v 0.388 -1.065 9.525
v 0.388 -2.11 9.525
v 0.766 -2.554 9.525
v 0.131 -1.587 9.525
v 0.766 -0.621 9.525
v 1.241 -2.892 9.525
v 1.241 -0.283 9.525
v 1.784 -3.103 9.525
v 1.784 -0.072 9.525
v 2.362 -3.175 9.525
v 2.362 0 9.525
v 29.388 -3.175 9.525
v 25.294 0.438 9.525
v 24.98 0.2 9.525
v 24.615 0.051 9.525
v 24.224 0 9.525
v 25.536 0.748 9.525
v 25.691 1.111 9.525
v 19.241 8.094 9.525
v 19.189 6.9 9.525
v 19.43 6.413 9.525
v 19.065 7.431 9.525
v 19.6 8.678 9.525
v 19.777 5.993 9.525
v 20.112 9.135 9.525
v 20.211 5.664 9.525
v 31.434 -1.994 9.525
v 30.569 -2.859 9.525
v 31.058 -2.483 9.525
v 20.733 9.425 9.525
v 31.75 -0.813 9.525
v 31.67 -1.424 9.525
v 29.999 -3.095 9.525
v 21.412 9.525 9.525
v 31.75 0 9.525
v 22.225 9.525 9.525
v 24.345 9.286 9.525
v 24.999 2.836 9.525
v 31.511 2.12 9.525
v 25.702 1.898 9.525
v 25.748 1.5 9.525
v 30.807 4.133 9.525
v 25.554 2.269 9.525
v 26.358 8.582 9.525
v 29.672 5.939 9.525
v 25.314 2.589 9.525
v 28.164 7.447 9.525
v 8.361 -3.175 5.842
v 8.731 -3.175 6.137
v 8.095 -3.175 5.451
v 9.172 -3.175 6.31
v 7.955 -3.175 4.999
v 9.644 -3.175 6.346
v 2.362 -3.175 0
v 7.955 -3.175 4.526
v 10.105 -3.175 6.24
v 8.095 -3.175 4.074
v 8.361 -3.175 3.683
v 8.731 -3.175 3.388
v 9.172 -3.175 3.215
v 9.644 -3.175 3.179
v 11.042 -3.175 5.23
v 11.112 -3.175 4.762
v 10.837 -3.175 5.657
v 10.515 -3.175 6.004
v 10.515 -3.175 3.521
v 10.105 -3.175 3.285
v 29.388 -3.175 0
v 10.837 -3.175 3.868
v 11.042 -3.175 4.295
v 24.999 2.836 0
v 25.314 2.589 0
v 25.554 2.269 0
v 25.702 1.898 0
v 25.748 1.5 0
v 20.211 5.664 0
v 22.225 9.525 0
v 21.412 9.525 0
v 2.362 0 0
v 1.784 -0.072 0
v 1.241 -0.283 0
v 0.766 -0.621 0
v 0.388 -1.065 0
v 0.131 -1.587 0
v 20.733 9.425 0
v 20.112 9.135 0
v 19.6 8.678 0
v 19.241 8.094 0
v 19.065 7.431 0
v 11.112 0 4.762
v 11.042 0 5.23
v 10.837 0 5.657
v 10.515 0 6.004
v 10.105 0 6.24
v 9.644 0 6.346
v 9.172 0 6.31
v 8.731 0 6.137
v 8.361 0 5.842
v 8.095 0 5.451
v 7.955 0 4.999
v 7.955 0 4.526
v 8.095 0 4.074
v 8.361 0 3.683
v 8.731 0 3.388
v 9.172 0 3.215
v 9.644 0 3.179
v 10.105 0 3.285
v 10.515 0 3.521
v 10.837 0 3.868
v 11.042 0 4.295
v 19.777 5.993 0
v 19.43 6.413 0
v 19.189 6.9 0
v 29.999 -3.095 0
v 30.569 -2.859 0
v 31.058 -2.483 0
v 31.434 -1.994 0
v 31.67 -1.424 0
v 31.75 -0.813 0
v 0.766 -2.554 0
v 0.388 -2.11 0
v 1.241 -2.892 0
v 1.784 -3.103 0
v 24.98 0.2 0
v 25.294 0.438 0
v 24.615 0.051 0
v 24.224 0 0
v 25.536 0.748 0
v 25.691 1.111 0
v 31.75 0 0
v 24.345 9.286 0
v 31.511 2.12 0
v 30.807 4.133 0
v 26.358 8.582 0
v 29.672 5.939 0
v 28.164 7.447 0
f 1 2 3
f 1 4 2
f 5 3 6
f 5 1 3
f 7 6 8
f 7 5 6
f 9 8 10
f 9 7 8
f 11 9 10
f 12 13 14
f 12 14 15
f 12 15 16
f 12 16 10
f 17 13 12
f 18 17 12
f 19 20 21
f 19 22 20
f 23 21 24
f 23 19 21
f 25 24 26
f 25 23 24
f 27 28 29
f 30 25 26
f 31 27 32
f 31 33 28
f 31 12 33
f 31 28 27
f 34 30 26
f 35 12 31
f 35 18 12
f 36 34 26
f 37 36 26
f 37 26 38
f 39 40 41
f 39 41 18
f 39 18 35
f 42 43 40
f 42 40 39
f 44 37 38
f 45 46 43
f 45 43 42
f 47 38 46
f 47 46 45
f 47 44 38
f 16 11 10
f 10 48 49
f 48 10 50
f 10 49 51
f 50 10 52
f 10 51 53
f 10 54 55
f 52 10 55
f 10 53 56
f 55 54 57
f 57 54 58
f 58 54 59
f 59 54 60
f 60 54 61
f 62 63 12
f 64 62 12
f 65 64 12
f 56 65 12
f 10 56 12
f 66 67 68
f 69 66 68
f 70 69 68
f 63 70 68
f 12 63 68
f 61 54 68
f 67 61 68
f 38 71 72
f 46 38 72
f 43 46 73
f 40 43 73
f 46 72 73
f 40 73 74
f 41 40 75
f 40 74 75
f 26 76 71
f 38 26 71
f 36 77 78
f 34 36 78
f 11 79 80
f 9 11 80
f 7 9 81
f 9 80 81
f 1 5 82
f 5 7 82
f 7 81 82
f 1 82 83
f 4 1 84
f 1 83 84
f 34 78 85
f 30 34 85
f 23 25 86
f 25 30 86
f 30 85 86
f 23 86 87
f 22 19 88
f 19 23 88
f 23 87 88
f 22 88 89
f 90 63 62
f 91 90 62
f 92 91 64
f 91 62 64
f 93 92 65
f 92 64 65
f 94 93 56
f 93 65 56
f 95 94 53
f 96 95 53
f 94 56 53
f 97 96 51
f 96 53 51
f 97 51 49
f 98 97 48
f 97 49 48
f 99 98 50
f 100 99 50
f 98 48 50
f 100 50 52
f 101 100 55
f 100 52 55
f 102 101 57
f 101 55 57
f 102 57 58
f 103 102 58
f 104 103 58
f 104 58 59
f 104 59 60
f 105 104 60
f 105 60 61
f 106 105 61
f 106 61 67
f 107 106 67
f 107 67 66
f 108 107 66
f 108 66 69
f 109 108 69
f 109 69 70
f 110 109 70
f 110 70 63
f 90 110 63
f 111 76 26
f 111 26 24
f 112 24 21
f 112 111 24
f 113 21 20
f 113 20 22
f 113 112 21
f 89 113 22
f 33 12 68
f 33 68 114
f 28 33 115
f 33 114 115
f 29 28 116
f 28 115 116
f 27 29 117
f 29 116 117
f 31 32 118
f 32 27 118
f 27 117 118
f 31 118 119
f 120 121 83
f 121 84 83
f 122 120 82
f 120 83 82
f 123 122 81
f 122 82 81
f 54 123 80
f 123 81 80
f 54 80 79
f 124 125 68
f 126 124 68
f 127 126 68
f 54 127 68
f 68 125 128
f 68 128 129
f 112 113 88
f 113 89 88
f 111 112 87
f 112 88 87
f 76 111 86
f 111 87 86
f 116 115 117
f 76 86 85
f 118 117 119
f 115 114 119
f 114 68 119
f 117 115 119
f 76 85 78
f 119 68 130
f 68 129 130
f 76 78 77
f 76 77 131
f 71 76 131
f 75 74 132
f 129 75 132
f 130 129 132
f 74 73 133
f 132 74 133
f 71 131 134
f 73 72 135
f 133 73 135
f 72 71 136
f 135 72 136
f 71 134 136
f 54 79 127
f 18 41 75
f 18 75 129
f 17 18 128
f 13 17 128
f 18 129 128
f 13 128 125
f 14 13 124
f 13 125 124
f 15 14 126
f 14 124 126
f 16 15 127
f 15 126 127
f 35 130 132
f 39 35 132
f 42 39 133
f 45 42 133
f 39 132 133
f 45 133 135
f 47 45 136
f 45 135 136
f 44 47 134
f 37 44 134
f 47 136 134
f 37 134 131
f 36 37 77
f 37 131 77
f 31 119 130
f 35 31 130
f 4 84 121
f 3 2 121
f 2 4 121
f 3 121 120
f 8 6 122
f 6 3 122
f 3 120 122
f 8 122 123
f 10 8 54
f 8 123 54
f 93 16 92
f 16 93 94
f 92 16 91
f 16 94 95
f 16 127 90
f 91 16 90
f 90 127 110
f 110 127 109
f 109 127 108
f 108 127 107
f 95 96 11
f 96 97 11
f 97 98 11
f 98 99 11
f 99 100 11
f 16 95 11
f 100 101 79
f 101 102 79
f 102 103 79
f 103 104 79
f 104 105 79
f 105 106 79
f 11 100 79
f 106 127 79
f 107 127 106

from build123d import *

# Parameters (mm, degrees)
F1_DEPTH    = 9.525
F2_R        = 1.5875
F3_DEPTH    = 12.701
F4_T1_DEPTH = 21.336
F4_T3_DEPTH = 16.266474116


# Not quite as in the source:
# - a fillet or chamfer that OpenCascade refuses, or shapes differently, is made with other operations: its cross-section is extruded or revolved along the edge and cut away or added


with BuildPart() as f1:
    # F0 (on Top) → F1 (new body)
    with BuildSketch(Plane.XY):
        with BuildLine():
            Line((24.2244322948, 0), (0, 0))
            Line((0, 0), (0, -3.175))
            Line((0, -3.175), (31.75, -3.175))
            Line((31.75, -3.175), (31.75, 0))
            Line((31.75, 0), (25.748250134, 1.5004374665))
            ThreePointArc((25.748250134, 1.5004374665), (25.2936999645, 0.4380706052), (24.2244322948, 0))
        make_face()
        with BuildLine():
            ThreePointArc((24.9994406757, 2.8362263561), (25.5538056385, 2.2692130656), (25.748250134, 1.5004374665))
            Line((25.748250134, 1.5004374665), (31.75, 0))
            ThreePointArc((31.75, 0), (28.9601920908, 6.7351920908), (22.225, 9.525))
            Line((22.225, 9.525), (19.05, 9.525))
            Line((19.05, 9.525), (19.05, 6.35))
            Line((19.05, 6.35), (24.9994406757, 2.8362263561))
        make_face()
    extrude(amount=F1_DEPTH)

    # F2 (on face) → F3 (cut, through all)
    with BuildSketch(Plane.XZ.offset(3.175)):
        with Locations((9.525, 4.7625)):
            Circle(F2_R)
    extrude(amount=-F3_DEPTH, mode=Mode.SUBTRACT)

    # F4: fillet of radius 2.3622 on 5 edges, made by hand

    # F4_s2 → F4_t1 (cut)
    with BuildSketch(Plane.XY.offset(-5.9055)):
        with BuildLine():
            ThreePointArc((29.3878, -3.175), (31.0581276385, -2.4831276385), (31.75, -0.8128))
            Line((31.75, -0.8128), (31.75, -3.175))
            Line((31.75, -3.175), (29.3878, -3.175))
        make_face()
        with BuildLine():
            ThreePointArc((21.4122, 9.525), (19.7418723615, 8.8331276385), (19.05, 7.1628))
            Line((19.05, 7.1628), (19.05, 9.525))
            Line((19.05, 9.525), (21.4122, 9.525))
        make_face()
        with BuildLine():
            ThreePointArc((0, -0.8128), (0.6918723615, -2.4831276385), (2.3622, -3.175))
            Line((2.3622, -3.175), (0, -3.175))
            Line((0, -3.175), (0, -0.8128))
        make_face()
        with BuildLine():
            ThreePointArc((2.3622, 0), (0.6918723615, -0.6918723615), (0, -2.3622))
            Line((0, -2.3622), (0, 0))
            Line((0, 0), (2.3622, 0))
        make_face()
    extrude(amount=F4_T1_DEPTH, mode=Mode.SUBTRACT)

    # F4_s4 → F4_t3 (cut)
    with BuildSketch(Plane.XY.offset(-3.370737058)):
        with BuildLine():
            ThreePointArc((20.2109370097, 5.6643439713), (19.3606624942, 6.5273197158), (19.05, 7.6982948232))
            Line((19.05, 7.6982948232), (19.05, 6.35))
            Line((19.05, 6.35), (20.2109370097, 5.6643439713))
        make_face()
    extrude(amount=F4_T3_DEPTH, mode=Mode.SUBTRACT)


solid = f1.part
